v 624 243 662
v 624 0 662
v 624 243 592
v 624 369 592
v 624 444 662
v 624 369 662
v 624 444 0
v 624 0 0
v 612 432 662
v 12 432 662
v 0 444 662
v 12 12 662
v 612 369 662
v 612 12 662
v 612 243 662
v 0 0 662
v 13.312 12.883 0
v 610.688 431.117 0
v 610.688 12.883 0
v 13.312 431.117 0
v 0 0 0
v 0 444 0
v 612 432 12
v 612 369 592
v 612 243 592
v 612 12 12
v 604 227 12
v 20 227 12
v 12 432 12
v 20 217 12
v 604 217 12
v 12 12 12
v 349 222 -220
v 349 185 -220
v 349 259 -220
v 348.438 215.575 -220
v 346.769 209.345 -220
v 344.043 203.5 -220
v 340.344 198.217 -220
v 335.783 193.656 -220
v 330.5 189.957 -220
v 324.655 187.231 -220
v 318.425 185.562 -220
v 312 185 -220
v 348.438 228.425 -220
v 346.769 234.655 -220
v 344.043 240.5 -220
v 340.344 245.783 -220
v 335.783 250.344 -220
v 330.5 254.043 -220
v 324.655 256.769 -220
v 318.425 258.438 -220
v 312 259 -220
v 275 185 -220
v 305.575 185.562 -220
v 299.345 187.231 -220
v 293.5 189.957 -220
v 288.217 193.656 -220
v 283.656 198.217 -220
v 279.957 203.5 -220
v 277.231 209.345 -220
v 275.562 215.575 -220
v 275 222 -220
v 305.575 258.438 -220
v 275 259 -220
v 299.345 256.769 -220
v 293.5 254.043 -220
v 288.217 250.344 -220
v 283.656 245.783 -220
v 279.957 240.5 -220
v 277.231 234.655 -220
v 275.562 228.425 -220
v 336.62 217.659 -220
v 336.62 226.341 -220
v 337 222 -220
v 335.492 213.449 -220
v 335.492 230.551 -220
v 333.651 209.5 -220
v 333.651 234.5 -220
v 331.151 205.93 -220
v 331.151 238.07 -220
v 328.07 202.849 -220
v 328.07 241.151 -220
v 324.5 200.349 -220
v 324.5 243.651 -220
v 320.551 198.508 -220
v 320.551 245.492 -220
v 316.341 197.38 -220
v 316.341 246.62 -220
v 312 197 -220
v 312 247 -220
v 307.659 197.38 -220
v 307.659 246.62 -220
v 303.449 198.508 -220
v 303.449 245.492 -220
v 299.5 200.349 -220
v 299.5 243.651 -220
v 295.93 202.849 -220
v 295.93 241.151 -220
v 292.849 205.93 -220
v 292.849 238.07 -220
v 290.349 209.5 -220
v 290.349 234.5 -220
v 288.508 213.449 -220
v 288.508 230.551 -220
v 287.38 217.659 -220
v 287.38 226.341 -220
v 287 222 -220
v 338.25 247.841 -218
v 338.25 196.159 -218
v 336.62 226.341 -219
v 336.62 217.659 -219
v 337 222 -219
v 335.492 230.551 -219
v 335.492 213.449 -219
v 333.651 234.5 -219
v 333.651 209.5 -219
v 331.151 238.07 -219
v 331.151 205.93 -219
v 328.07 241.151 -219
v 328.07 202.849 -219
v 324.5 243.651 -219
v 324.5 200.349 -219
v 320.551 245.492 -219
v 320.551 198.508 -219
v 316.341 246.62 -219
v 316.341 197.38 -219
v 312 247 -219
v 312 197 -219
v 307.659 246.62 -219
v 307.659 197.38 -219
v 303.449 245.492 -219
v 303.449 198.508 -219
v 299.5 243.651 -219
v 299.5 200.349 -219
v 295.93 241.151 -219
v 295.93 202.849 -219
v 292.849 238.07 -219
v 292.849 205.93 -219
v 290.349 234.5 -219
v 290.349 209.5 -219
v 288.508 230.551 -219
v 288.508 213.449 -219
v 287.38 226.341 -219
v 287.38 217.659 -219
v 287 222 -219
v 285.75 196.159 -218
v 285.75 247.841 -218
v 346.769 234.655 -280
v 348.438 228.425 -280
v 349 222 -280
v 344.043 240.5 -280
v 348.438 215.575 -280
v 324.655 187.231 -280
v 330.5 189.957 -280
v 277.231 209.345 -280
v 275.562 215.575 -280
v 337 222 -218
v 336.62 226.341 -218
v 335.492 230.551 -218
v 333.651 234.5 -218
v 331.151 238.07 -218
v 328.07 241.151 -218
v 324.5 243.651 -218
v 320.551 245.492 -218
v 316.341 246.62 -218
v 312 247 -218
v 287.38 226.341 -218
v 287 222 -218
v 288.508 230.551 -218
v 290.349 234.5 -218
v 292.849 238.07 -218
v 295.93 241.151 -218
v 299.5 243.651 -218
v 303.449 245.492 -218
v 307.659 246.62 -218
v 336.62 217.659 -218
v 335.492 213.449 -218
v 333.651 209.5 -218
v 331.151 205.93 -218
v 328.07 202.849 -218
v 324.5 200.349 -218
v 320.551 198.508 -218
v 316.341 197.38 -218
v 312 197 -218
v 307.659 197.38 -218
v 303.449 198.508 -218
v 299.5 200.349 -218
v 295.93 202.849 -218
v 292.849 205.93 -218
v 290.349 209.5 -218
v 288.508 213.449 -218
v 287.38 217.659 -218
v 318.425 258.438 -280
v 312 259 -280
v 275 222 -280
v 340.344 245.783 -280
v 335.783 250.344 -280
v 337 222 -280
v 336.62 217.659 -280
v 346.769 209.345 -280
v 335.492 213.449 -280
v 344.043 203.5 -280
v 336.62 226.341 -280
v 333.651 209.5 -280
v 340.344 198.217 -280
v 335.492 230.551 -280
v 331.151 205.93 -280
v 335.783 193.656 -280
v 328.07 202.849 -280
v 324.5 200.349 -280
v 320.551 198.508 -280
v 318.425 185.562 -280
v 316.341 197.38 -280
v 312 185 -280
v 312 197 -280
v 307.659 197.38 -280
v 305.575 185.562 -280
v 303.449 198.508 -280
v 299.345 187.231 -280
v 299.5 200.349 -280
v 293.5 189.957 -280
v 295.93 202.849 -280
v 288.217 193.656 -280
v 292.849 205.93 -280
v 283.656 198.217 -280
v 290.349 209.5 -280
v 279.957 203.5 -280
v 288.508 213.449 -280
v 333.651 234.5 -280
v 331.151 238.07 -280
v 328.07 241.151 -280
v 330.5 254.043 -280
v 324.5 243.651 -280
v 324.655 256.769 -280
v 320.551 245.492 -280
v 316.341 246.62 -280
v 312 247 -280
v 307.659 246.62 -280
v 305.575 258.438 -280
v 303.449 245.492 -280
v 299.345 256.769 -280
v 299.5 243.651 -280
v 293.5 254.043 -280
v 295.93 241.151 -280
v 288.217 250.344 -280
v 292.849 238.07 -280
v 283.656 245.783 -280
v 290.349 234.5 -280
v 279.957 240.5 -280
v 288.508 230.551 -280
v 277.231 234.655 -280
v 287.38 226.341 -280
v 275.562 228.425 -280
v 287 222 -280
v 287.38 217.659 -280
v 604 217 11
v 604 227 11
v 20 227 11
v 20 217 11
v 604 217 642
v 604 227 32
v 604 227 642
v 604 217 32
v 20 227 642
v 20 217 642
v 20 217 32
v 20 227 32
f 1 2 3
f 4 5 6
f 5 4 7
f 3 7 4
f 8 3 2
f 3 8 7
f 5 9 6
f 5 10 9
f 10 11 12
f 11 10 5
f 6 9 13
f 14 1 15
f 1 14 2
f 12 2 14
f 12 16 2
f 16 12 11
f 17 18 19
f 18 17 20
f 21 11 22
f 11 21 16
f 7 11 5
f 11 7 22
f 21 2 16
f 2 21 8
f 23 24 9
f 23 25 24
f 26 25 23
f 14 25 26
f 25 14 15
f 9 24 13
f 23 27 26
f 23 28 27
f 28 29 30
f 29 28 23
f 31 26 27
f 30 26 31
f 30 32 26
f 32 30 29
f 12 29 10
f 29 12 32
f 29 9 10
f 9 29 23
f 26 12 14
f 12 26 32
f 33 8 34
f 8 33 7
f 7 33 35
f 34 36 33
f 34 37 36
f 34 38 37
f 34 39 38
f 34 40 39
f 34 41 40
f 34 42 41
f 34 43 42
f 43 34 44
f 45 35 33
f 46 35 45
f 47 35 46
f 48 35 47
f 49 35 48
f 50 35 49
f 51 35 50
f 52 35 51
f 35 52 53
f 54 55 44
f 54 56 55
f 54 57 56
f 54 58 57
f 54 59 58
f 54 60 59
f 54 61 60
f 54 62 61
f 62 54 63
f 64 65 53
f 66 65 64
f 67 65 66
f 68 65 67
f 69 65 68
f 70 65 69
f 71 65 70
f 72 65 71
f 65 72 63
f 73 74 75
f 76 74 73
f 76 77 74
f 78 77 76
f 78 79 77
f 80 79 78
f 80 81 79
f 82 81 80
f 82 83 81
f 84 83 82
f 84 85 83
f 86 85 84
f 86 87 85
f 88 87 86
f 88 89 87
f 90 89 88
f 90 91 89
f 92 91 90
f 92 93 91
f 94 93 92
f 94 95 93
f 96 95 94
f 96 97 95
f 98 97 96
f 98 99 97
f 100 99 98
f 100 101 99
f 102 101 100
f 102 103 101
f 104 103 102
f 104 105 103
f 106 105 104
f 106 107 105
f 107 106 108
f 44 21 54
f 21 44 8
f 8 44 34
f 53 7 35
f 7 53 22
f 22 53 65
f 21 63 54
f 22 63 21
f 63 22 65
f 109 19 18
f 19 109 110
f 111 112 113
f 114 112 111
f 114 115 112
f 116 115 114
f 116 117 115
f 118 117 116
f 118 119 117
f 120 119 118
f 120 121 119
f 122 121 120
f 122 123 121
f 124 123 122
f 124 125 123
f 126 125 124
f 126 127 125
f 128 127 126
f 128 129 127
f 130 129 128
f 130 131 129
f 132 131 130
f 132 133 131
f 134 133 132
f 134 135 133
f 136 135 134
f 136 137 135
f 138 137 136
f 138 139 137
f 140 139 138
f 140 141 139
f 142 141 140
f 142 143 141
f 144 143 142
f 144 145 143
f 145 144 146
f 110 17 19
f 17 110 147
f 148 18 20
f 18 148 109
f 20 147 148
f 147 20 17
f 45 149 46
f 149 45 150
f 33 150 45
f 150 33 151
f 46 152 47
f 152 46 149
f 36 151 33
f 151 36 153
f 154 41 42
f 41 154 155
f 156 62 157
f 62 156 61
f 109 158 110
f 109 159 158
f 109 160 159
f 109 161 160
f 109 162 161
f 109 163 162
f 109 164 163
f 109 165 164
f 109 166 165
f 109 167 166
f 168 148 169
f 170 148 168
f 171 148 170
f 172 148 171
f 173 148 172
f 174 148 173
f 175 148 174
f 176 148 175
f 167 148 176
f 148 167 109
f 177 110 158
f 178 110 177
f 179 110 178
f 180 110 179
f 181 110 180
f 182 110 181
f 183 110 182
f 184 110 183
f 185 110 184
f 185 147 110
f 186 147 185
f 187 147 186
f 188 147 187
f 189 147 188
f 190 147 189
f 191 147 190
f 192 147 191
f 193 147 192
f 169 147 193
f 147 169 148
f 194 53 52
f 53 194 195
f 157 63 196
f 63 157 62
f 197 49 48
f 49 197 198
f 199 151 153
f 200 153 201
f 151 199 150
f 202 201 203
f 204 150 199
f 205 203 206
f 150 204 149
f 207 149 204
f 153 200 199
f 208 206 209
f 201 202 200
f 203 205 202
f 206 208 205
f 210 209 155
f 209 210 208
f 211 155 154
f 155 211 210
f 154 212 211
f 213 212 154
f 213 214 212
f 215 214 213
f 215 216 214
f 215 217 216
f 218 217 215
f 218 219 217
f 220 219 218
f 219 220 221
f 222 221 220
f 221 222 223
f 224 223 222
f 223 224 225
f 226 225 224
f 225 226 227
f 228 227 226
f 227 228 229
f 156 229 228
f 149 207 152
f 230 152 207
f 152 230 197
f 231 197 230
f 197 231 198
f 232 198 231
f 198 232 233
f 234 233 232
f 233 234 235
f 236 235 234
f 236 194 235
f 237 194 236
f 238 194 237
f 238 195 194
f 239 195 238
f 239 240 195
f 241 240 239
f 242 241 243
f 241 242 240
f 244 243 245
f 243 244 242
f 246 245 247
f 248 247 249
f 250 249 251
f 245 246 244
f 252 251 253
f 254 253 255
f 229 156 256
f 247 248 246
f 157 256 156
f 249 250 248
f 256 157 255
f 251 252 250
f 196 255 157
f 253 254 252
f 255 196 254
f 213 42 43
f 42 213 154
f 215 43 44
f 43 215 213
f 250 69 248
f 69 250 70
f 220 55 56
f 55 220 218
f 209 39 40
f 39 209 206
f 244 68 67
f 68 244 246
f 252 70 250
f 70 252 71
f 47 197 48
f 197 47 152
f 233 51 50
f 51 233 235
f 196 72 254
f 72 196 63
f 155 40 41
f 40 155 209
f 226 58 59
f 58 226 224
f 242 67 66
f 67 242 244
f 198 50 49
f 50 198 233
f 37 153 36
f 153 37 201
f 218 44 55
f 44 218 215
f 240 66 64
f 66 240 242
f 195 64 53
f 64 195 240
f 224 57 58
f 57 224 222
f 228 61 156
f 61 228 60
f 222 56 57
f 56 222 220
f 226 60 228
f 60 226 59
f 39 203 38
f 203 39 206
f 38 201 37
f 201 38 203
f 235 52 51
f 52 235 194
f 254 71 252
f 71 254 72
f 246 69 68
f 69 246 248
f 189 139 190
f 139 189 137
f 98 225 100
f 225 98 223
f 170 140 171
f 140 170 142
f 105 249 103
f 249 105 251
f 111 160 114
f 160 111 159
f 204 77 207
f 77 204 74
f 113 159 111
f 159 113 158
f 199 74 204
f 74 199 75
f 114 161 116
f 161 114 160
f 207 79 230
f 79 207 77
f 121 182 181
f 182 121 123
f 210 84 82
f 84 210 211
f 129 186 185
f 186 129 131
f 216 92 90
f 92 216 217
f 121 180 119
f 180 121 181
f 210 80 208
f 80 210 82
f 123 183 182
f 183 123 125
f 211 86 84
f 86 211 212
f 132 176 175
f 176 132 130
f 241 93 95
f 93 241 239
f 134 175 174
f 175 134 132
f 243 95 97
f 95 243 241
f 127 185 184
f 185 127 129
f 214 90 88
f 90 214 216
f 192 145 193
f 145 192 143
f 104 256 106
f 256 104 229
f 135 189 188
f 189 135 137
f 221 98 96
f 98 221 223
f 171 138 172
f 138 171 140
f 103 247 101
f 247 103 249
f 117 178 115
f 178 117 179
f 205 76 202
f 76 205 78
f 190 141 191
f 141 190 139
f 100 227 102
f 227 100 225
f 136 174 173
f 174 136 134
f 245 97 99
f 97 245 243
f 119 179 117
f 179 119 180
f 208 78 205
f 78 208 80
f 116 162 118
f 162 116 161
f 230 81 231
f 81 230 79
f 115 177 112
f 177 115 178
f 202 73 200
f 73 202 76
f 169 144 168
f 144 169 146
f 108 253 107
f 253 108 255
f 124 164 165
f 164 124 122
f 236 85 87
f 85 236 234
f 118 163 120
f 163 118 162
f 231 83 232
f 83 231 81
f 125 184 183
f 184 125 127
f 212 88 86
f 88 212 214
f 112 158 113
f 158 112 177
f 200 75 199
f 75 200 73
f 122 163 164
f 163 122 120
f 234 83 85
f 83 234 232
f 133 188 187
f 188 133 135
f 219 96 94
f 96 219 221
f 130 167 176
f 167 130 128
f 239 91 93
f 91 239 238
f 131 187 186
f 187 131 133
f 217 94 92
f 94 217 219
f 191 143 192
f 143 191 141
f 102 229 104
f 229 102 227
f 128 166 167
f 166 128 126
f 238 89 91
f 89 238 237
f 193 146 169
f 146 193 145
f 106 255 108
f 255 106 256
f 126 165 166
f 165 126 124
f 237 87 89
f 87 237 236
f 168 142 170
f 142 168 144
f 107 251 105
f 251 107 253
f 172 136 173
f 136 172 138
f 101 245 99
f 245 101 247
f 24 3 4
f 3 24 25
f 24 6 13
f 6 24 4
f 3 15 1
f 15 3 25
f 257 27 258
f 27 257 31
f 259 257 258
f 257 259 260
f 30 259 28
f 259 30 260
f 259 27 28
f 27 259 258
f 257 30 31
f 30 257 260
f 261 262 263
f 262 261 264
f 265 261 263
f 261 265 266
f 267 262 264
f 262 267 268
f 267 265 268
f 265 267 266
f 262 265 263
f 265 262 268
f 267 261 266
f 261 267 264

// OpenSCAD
// file: params.scad
// Shared millimetre parameters. Keep in lockstep with freecad/params.py.
// Module scale: 150 kg/day wet train. Walls are CPVC sheet, not metal.

$fn = 36;

WALL        = 12;     // CPVC sheet thickness
FLOOR       = 16;     // floor plate (trough sits on this)

// LEACH CSTR 1 — inside liquor box
CSTR_L      = 2000;
CSTR_W      = 1200;
CSTR_H      = 1400;   // liquid + freeboard
FREEBOARD   = 200;

// CSTR 2 weir (same vessel, +X wall)
WEIR_W      = 450;
WEIR_CREST  = CSTR_H - FREEBOARD;   // from inner floor
WEIR_SLOT_H = 80;
WEIR_LIP    = 120;    // external spout projection

// CSTR 3 floor auger — injection-molded PVC / FG
AUGER_D     = 140;    // flight OD
AUGER_SHAFT = 40;
AUGER_PITCH = 110;
AUGER_TROUGH_W = 180;
AUGER_TROUGH_H = 110;
AUGER_OFFSET_Y = 280; // trough centreline from inner -Y wall
AUGER_INCLINE  = 28;  // deg, lifts out of liquor toward +X

// mixer / nozzles (lid)
MIXER_D     = 50;
GAS_D       = 80;     // acid-gas takeoff
DROP_X      = 80;     // inner-X of shred drop slot
DROP_L      = 400;
DROP_W      = 250;
DROP_COAM   = 80;     // raised coaming around the slot

// LEACHATE PUMP / coarse strainer — −X wall, opposite the weir
PUMP_D      = 80;     // DN80
PUMP_Z      = 450;    // centreline above inner floor (submerged)
PUMP_Y      = 900;    // centreline from inner −Y (away from auger)
STRAINER_L  = 180;
STRAINER_W  = 140;
STRAINER_H  = 160;

// mezzanine feed train
MEZZ_H      = 2200;   // platform top above tank outer floor
MEZZ_L      = 1600;   // platform length in −X
MEZZ_THK    = 12;
HOPPER_L    = 700;
HOPPER_W    = 600;
HOPPER_H    = 800;
SHRED_L     = 500;
SHRED_W     = 500;
SHRED_H     = 450;
CONV_W      = 240;
CONV_H      = 120;
CONV_PLATE  = 6;      // trough plate
CONV_FLANGE = 40;
CONV_SPRING_D = 50;
CONV_SPRING_H = 80;
CONV_BOLT   = 10;     // M10 clearance
CONV_LEN    = 1800;   // default standalone length; plant instance is computed
DUST_D      = 150;    // dust-hood outlet to DUST header
AUGER_LIFT_L = 700;

// dewater belts + split (Phase A 4–6)
FDEW_L      = 1800;
FDEW_W      = 450;
FDEW_H      = 80;
FDEW_RISE   = 120;    // solids end higher so liquor runs back to weir
SDEW_L      = 1400;
SDEW_W      = 220;
SDEW_H      = 80;
SPLIT_L     = 600;
SPLIT_W     = 500;
SPLIT_H     = 400;
STUB_L      = 400;
STUB_W      = 300;
STUB_H      = 250;

// EW funnel cell
EW_L        = 600;    // along aisle (overflow direction)
EW_W        = 420;    // anode-cathode depth
EW_H        = 650;    // rectangular body
EW_FUNNEL_H = 220;
EW_VALVE_D  = 50;
EW_VALVE_L  = 60;
EW_MEM_T    = 4;      // CEM
EW_SLOT     = 10;     // membrane cassette slot
EW_PITCH    = 750;    // aisle spacing, centre to centre
AISLE_X0    = 200;
AISLE_Y     = -(EW_W + 2*WALL) - 400;
AISLE_Z     = 400;
BUND_H      = 150;
BUND_PAD    = 250;
SUMP_L      = 400;
SUMP_W      = 400;
SUMP_H      = 300;
VDF_D       = 700;
VDF_L       = 900;
PAIL_W      = 180;
HDR_D       = 80;
HDR_Z       = 1400;
PYRO_D      = 320;
PYRO_L      = 2800;

// Campus envelopes — lockstep with freecad/params.py
FARM_X=12000; FARM_Y=8000; FARM_L=12000; FARM_W=8000; FARM_H=4500;
FAB_X=12000;  FAB_Y=-6000; FAB_L=8000;   FAB_W=6000;  FAB_H=4000;
HAB_X=-8000;  HAB_Y=8000;  HAB_L=8000;   HAB_W=6000;  HAB_H=3200;
CRYO_X=-6000; CRYO_Y=-4000; CRYO_L=4000; CRYO_W=3000; CRYO_H=3000;
MFG_X=2000;   MFG_Y=9000;  MFG_L=6000;   MFG_W=4000;  MFG_H=3500;

LIFE_Z_GREY=900; LIFE_Z_UPW=1100; LIFE_Z_ETCH=1300;
LIFE_Z_O2=2800; LIFE_Z_N2=3000; LIFE_Z_CO2=3200;
LIFE_D_GREY=50; LIFE_D_UPW=40; LIFE_D_ETCH=32;
LIFE_D_GAS=25; LIFE_D_CO2=40;
// main file
// Funnel-bottom EW / PK cell. A | CEM | C. Instance along +X.
include <params.scad>;

module ew_body() {
    t = WALL;
    l = EW_L; w = EW_W; h = EW_H;
    difference() {
        cube([l + 2*t, w + 2*t, h + t]);
        translate([t, t, t])
            cube([l, w, h + 1]);
    }
}

module ew_funnel() {
    t = WALL;
    top_l = EW_L + 2*t;
    top_w = EW_W + 2*t;
    bot = EW_VALVE_D + 2*t;
    // outer funnel
    difference() {
        hull() {
            translate([0, 0, 0])
                cube([top_l, top_w, 1]);
            translate([(top_l - bot)/2, (top_w - bot)/2, -EW_FUNNEL_H])
                cube([bot, bot, 1]);
        }
        hull() {
            translate([t, t, 1.05])
                cube([EW_L, EW_W, 1]);
            translate([(top_l - EW_VALVE_D)/2, (top_w - EW_VALVE_D)/2, -EW_FUNNEL_H + 1])
                cube([EW_VALVE_D, EW_VALVE_D, 1]);
        }
    }
    // valve stub
    translate([top_l/2, top_w/2, -EW_FUNNEL_H - EW_VALVE_L])
        difference() {
            cylinder(h=EW_VALVE_L + 2, d=EW_VALVE_D + 2*t);
            translate([0, 0, -1])
                cylinder(h=EW_VALVE_L + 4, d=EW_VALVE_D);
        }
}

module cem_cassette() {
    // slot on the Y mid-plane (A toward -Y, C toward +Y)
    t = WALL;
    x = t + 8;
    y = t + EW_W/2 - EW_SLOT/2;
    translate([x, y, t + 20])
        cube([EW_L - 16, EW_SLOT, EW_H - 40]);
    // CEM plate in the slot
    color("steelblue")
    translate([x + 2, y + (EW_SLOT - EW_MEM_T)/2, t + 24])
        cube([EW_L - 20, EW_MEM_T, EW_H - 50]);
}

module overflow_weir() {
    // liquor overflows +X wall into the next cell
    t = WALL;
    translate([t + EW_L - 1, t + EW_W*0.55, t + EW_H - 70])
        cube([t + 2, EW_W*0.30, 80]);
}

module ew_cell() {
    color("whitesmoke")
    difference() {
        union() {
            translate([0, 0, 0]) ew_body();
            ew_funnel();
        }
        overflow_weir();
        // cassette pocket through the floor of the body so the plate seats
        translate([WALL + 8, WALL + EW_W/2 - EW_SLOT/2, WALL - 1])
            cube([EW_L - 16, EW_SLOT, EW_H]);
    }
    cem_cassette();
}

ew_cell();
